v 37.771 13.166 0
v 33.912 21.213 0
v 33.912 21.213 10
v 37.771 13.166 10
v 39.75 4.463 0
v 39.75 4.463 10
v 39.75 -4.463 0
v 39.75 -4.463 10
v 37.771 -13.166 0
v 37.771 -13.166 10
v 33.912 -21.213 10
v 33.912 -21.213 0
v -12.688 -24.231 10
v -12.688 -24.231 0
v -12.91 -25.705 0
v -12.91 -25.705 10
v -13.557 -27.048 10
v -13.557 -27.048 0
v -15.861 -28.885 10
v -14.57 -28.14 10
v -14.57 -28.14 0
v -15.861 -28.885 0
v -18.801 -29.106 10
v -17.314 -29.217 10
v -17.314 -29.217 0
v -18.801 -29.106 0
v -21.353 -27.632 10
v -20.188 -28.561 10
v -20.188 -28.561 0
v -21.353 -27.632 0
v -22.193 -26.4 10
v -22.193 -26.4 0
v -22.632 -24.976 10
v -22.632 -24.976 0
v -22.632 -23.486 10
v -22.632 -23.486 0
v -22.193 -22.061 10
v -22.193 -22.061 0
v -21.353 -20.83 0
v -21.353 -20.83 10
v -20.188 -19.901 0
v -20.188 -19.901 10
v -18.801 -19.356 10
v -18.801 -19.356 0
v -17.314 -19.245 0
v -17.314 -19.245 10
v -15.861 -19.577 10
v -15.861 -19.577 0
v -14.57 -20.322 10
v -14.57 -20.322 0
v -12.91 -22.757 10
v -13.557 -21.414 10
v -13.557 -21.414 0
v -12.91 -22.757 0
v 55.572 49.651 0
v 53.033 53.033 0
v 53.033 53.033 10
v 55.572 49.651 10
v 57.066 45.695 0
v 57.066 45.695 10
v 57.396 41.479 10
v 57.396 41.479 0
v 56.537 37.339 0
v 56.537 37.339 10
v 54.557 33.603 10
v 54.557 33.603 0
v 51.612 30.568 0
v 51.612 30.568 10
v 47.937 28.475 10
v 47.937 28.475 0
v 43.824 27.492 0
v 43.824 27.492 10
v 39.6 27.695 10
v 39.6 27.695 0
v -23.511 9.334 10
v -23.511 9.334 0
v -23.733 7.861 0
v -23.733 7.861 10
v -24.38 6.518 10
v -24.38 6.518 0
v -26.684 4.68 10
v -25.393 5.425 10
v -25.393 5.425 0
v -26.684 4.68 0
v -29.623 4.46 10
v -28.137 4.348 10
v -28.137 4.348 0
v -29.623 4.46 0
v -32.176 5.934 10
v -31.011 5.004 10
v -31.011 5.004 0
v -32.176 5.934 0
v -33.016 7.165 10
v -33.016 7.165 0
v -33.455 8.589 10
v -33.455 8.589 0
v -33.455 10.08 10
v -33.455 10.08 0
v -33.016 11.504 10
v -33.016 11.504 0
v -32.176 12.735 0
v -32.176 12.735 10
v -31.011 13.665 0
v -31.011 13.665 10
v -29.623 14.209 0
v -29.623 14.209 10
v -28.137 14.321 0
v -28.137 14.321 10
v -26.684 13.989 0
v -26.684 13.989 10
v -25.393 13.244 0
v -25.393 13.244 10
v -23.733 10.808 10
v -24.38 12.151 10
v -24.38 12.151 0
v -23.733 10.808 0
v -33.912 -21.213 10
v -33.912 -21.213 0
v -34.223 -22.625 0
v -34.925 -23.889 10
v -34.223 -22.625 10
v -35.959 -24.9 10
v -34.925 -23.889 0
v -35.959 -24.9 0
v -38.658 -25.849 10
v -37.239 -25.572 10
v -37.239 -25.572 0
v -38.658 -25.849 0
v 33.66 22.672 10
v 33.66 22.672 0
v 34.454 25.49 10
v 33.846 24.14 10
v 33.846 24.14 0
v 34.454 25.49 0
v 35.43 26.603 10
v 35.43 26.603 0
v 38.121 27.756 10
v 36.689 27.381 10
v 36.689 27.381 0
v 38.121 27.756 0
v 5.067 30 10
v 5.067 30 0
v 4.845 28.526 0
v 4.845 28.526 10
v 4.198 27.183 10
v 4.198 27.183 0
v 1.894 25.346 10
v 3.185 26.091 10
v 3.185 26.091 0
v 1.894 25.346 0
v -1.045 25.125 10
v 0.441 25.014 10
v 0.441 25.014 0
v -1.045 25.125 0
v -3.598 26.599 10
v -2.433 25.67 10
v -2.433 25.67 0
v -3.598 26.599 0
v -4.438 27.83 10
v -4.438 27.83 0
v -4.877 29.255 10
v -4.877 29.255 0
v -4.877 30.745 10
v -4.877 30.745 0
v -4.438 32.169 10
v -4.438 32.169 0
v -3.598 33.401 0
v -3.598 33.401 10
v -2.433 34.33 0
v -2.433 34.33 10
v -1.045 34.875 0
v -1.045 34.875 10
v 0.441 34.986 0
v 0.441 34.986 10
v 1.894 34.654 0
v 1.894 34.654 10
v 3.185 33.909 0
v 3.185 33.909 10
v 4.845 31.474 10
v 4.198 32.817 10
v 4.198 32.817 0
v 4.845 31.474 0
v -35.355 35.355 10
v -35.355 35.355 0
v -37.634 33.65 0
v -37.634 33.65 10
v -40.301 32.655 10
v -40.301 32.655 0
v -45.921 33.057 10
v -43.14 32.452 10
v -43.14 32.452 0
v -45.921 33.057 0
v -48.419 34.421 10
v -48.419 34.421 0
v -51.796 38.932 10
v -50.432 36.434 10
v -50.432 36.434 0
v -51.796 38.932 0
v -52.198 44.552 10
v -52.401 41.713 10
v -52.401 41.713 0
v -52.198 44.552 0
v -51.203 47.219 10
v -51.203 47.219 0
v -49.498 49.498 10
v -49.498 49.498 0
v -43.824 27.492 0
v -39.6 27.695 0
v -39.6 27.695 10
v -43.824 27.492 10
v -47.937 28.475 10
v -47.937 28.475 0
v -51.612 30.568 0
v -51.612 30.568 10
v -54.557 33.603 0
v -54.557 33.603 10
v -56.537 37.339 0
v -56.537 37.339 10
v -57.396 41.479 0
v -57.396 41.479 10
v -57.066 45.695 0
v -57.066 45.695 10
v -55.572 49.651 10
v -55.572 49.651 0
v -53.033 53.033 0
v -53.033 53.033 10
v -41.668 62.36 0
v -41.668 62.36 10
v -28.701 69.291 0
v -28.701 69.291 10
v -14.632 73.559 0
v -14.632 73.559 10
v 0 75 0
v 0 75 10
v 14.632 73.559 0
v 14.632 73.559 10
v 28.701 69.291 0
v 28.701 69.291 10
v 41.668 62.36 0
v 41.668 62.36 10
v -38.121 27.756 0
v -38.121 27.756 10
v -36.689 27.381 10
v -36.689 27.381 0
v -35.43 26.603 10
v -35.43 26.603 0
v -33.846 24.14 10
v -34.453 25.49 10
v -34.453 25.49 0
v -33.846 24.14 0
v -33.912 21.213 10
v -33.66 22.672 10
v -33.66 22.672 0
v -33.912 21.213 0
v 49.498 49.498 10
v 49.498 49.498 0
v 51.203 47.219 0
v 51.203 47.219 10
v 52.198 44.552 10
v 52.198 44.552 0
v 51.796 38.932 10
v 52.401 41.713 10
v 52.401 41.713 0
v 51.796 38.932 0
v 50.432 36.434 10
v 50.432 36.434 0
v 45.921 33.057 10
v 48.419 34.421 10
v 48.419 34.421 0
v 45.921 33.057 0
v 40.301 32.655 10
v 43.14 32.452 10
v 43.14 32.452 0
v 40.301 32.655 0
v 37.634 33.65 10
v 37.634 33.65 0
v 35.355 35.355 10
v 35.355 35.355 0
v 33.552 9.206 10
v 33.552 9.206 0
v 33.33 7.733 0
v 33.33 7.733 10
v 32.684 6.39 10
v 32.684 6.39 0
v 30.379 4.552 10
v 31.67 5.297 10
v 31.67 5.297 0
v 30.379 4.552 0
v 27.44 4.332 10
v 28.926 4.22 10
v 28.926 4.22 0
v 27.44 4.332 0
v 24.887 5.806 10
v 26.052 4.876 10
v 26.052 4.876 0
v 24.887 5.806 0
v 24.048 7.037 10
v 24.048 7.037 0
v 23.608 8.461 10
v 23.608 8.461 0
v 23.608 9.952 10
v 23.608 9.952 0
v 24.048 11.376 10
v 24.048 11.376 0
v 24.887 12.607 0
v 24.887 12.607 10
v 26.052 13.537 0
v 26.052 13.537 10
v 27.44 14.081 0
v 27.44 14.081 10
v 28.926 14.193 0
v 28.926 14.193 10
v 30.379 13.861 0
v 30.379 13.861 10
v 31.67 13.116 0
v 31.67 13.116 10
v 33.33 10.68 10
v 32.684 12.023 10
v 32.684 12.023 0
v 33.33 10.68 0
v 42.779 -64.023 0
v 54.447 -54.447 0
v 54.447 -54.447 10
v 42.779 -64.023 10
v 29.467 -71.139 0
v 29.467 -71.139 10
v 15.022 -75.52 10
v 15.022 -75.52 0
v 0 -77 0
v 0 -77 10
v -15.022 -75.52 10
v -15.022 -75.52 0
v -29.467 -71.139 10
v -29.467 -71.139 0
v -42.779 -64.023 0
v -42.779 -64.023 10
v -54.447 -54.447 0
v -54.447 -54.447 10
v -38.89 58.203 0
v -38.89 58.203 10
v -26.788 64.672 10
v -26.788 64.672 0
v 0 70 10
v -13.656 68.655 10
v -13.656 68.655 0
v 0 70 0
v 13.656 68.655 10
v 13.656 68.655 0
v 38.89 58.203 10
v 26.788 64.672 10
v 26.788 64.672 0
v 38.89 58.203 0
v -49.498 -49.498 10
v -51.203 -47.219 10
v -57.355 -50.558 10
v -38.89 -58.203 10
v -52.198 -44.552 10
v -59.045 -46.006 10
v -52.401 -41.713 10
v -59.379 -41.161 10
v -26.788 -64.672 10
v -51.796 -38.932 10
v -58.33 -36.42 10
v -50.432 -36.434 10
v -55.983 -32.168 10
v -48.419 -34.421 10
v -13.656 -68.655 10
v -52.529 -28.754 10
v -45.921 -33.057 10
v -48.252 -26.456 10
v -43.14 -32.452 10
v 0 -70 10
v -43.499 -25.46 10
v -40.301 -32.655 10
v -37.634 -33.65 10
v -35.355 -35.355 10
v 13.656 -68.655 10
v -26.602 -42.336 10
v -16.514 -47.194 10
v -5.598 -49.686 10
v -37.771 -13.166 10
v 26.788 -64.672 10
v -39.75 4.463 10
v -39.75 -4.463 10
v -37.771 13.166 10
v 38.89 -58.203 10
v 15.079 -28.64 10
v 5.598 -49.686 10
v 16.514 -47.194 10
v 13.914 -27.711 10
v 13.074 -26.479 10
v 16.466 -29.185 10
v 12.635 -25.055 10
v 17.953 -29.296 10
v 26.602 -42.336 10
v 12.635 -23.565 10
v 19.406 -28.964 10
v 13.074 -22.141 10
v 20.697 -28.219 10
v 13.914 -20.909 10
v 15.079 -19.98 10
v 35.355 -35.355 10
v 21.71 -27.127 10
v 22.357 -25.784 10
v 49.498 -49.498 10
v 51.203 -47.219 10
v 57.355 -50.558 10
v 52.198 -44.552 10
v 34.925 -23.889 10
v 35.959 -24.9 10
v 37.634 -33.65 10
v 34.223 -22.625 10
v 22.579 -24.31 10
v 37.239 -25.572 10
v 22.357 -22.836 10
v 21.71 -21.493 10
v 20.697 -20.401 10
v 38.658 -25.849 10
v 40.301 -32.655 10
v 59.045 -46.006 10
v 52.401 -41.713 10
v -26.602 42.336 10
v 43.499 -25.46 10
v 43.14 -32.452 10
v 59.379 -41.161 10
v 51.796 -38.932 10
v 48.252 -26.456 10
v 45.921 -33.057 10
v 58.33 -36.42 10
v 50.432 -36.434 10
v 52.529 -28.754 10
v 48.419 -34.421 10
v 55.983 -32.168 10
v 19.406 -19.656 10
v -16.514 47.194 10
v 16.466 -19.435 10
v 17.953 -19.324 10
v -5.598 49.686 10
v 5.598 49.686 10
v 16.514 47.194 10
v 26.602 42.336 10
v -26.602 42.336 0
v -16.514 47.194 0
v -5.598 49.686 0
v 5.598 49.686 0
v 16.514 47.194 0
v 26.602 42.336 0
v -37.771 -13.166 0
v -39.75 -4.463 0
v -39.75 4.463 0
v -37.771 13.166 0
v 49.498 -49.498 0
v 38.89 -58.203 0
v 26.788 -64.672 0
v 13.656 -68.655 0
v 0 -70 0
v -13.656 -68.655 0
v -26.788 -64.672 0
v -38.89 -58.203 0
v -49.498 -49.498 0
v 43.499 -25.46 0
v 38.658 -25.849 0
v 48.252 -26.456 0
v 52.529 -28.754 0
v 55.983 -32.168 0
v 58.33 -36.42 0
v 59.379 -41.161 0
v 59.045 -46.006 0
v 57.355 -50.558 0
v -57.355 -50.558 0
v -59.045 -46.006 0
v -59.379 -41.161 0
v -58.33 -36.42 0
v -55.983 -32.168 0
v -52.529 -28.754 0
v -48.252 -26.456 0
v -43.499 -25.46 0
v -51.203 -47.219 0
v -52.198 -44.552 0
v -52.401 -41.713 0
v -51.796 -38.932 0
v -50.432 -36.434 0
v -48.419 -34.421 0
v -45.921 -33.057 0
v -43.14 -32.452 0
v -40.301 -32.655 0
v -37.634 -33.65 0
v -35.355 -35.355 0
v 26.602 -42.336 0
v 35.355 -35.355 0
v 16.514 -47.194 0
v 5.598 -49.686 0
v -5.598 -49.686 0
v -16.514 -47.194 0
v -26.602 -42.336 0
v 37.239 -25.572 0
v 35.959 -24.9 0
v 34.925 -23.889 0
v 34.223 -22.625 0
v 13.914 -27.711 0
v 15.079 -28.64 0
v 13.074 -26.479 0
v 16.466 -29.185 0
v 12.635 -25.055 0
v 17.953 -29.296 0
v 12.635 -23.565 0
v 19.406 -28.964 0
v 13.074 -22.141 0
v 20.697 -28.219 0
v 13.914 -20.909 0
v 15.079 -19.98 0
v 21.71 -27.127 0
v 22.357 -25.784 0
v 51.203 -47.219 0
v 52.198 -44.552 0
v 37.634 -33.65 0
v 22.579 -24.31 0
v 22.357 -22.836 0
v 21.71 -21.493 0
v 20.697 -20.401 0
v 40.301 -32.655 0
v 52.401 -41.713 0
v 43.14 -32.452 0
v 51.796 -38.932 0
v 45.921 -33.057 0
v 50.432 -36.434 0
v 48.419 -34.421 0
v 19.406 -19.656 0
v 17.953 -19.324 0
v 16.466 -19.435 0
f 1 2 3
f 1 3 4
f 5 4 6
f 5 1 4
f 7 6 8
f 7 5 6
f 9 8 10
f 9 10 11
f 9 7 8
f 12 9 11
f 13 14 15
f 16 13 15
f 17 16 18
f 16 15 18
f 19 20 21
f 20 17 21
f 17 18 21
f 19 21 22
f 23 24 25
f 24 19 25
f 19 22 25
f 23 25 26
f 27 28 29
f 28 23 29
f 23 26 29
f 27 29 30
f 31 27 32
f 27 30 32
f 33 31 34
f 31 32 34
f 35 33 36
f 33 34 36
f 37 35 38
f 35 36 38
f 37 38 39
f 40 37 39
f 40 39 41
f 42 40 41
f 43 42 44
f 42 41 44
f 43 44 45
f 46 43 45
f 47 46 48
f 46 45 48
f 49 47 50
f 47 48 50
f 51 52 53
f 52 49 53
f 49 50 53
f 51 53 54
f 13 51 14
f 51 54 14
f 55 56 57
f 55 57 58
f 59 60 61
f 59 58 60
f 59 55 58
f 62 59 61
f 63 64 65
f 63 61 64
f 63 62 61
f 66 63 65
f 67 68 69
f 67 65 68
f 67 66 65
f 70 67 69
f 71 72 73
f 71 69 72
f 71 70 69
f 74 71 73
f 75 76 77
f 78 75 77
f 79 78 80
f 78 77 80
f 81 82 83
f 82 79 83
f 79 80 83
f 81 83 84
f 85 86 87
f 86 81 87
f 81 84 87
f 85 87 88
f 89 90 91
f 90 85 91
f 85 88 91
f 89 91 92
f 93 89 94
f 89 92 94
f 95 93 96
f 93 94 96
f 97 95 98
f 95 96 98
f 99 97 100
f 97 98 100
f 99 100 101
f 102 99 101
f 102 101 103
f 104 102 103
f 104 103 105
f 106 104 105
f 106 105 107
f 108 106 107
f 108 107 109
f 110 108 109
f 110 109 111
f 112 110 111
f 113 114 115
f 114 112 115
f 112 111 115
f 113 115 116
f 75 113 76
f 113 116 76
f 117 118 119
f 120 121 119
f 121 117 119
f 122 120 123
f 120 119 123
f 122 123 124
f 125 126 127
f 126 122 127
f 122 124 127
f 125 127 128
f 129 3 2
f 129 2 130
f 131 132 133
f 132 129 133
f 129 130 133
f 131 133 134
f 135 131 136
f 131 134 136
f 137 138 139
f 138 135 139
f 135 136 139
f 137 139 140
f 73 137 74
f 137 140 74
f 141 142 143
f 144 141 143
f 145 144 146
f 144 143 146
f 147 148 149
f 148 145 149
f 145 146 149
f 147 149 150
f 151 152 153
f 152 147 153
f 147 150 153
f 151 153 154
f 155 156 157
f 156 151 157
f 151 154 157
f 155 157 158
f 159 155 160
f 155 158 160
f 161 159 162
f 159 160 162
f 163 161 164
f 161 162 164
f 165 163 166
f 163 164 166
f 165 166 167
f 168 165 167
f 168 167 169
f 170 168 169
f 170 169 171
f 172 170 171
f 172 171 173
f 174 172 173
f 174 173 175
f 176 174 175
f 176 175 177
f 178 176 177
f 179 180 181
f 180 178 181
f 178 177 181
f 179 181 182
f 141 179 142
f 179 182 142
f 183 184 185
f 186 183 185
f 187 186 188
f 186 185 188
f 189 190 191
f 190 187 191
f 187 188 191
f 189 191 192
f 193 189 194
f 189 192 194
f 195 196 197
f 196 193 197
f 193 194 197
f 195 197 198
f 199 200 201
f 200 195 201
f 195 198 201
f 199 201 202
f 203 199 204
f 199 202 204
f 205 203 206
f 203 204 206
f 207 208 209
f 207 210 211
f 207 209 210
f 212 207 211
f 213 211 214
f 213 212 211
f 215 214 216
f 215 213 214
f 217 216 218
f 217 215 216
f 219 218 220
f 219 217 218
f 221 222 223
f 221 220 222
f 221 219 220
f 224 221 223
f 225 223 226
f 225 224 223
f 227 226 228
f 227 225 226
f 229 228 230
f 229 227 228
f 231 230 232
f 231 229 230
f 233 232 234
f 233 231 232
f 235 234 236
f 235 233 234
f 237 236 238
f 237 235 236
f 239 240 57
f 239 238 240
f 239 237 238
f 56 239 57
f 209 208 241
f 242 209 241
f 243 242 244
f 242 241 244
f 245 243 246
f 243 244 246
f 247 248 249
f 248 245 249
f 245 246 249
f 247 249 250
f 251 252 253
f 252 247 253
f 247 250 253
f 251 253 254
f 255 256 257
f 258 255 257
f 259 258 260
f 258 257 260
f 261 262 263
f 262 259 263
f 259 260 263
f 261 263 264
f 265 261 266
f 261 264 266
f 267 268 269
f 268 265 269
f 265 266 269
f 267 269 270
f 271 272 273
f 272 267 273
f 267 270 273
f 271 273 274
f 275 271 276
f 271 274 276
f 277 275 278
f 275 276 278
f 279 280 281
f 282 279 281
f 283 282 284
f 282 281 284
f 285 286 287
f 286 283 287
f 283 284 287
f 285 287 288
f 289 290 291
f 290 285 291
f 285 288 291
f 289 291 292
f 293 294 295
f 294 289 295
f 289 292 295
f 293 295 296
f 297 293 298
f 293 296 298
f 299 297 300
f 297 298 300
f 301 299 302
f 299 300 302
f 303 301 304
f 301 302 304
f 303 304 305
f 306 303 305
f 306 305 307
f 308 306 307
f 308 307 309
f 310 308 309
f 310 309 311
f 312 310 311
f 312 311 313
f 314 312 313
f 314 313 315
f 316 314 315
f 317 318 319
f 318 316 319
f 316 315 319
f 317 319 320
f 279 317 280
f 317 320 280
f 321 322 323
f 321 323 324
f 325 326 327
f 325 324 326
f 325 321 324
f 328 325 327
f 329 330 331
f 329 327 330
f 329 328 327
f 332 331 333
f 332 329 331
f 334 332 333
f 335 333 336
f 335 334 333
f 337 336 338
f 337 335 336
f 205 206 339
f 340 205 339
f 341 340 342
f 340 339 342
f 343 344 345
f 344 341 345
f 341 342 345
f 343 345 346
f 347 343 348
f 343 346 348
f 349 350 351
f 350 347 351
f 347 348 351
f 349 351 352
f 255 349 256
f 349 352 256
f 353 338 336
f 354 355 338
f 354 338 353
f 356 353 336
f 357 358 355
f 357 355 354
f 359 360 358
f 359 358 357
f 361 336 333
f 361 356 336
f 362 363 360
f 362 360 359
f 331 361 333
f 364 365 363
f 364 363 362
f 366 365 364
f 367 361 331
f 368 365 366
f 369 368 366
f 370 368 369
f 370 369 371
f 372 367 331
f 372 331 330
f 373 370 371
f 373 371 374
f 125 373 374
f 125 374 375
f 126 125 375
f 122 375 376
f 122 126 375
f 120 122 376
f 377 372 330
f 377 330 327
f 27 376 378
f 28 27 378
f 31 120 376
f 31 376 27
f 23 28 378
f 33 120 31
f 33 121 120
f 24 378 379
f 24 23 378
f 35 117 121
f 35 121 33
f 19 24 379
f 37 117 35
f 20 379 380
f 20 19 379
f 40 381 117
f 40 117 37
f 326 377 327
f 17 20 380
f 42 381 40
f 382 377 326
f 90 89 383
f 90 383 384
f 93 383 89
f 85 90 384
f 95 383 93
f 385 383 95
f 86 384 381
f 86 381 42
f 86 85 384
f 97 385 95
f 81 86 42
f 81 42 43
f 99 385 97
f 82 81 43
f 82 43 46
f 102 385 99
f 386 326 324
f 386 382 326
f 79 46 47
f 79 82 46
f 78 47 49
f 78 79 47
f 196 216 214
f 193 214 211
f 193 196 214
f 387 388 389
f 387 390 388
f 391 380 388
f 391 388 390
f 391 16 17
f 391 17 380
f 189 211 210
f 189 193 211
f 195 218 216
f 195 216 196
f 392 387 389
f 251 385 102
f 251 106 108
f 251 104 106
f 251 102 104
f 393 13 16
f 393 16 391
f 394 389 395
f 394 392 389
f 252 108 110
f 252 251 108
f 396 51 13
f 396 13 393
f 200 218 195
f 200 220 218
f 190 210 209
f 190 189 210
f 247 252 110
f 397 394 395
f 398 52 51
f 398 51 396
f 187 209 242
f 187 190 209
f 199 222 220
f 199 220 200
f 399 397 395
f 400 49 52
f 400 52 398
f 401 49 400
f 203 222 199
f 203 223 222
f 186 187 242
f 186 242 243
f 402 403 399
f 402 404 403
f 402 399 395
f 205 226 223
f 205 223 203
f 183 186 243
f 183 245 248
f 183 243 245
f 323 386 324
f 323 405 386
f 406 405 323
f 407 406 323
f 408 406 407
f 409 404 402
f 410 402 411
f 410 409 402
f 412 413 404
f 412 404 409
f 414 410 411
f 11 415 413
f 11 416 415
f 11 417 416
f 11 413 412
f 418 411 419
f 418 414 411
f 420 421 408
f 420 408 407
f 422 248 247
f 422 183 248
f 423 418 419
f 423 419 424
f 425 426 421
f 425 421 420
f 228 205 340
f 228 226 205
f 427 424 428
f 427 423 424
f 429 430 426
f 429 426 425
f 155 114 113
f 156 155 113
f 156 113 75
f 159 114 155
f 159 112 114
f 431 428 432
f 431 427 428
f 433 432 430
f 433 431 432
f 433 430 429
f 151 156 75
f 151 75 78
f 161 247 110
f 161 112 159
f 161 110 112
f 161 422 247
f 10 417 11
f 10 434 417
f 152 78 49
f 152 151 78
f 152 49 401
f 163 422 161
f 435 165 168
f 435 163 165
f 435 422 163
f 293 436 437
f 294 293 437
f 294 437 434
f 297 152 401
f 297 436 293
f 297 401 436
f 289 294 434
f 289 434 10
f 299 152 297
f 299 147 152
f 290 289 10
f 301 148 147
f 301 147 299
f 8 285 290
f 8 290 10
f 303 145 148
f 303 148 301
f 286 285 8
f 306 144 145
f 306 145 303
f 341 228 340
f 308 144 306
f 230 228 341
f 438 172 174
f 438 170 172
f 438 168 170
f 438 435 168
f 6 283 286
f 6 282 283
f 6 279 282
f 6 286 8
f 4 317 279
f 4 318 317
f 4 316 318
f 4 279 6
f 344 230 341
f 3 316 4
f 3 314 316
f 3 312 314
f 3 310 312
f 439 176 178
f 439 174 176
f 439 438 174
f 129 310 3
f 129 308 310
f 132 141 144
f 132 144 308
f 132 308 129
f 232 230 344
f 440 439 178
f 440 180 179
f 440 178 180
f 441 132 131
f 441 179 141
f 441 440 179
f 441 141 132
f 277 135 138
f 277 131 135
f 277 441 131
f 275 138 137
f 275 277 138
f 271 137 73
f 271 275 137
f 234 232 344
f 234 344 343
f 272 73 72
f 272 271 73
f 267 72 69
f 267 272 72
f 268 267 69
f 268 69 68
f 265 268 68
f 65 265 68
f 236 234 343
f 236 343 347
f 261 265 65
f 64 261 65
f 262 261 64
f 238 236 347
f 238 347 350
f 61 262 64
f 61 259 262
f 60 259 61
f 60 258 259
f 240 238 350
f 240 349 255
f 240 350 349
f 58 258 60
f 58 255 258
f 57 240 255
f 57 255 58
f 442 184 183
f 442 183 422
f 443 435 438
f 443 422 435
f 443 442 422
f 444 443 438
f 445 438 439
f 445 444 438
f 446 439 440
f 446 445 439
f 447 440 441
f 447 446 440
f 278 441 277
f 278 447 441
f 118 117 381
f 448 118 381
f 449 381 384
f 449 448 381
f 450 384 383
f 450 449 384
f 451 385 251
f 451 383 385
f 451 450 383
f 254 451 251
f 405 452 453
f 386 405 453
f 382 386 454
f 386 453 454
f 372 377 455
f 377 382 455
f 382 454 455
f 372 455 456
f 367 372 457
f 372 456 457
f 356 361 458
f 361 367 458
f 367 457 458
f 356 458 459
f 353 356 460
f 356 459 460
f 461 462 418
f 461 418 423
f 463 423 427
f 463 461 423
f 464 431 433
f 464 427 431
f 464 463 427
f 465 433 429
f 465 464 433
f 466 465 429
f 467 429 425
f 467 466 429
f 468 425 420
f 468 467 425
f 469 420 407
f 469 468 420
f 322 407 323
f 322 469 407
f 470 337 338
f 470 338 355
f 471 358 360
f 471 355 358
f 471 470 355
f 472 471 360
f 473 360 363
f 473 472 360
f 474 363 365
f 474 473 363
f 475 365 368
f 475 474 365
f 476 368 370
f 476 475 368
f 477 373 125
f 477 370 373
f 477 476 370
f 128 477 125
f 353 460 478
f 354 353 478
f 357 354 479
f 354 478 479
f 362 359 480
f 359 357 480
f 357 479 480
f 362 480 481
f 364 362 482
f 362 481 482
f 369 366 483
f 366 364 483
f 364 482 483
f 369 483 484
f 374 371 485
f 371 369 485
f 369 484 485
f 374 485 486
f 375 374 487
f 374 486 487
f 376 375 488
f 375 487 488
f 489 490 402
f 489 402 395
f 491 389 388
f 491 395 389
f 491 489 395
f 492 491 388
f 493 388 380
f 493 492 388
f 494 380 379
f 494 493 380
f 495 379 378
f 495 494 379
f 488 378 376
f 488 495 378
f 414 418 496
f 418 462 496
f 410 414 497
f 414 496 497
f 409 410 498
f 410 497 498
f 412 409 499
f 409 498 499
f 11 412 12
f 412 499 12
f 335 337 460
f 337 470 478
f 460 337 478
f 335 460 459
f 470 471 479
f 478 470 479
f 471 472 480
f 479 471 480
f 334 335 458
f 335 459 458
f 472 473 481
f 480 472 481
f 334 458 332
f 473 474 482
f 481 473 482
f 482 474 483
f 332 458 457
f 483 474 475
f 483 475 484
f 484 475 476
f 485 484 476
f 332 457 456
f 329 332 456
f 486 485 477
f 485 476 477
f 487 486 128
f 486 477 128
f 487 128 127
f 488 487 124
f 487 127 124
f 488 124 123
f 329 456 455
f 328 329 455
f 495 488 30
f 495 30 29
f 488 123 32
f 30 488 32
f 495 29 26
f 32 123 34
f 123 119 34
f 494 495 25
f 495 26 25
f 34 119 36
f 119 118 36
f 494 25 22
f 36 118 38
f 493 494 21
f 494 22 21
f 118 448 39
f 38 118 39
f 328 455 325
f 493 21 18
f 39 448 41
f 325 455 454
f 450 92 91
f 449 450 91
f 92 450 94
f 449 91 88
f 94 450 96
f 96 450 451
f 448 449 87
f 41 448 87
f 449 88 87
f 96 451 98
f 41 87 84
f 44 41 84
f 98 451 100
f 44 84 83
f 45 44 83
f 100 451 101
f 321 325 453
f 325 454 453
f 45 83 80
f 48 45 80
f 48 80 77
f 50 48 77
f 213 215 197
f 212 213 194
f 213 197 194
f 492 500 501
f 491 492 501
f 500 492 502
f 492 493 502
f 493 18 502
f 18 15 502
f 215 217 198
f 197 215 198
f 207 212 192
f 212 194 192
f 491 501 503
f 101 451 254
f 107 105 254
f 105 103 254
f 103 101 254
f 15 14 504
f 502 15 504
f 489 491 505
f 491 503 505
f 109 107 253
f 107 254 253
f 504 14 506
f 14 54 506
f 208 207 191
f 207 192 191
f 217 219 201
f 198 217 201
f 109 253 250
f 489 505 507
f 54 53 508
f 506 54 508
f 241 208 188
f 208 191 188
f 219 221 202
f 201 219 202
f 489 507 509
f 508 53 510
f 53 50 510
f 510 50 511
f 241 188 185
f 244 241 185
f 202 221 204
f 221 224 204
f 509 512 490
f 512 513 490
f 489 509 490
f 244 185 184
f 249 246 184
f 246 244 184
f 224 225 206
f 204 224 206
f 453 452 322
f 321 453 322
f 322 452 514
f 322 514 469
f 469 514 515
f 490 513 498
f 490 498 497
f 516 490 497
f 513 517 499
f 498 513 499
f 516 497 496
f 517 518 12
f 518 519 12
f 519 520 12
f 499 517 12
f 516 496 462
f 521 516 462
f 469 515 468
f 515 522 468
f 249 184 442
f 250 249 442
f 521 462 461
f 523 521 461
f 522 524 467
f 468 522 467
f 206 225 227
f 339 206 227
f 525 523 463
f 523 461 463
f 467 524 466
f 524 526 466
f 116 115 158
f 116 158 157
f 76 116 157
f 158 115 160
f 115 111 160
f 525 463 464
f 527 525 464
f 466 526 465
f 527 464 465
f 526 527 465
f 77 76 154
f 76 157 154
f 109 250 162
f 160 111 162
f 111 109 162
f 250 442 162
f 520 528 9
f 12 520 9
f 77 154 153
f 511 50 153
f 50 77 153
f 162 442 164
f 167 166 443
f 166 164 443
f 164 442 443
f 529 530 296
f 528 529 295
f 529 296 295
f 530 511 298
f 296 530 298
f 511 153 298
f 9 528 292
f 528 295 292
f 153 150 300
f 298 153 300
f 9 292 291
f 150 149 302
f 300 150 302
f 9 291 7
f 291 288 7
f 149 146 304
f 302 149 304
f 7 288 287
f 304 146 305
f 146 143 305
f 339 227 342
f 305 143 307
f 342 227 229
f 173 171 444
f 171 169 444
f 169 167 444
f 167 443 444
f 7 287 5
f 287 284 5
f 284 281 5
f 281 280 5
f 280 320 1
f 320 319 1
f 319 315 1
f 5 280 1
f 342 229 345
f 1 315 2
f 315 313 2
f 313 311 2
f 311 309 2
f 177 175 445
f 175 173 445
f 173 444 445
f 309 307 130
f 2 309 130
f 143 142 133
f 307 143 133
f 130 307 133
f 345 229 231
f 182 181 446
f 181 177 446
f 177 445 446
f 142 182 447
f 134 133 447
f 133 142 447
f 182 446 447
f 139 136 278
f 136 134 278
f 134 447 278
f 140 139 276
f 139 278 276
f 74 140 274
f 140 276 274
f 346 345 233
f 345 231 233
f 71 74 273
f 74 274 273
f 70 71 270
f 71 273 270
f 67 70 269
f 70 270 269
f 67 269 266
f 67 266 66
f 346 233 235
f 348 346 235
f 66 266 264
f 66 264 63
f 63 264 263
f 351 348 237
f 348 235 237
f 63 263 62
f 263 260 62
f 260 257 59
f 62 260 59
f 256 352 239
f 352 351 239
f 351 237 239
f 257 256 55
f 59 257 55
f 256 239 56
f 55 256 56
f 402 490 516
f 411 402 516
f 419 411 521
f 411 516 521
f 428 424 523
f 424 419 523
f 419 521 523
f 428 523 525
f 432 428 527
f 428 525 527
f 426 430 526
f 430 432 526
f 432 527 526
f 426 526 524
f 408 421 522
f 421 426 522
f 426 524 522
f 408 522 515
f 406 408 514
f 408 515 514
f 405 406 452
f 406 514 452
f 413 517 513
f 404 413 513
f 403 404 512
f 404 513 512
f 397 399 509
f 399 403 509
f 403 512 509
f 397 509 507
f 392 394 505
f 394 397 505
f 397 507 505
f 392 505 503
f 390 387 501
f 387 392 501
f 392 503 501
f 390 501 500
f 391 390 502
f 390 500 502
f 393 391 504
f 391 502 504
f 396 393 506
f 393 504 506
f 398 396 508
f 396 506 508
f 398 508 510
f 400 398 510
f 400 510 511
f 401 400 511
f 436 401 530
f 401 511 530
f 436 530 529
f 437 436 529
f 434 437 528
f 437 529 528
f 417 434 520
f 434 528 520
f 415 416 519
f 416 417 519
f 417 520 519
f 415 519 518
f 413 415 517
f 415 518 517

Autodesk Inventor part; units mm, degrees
ref_plane "YZ Plane" through (0, 0, 0) normal (1, 0, 0) x (0, 1, 0)
ref_plane "XZ Plane" through (0, 0, 0) normal (0, 1, 0) x (-1, 0, 0)
ref_plane "XY Plane" through (0, 0, 0) normal (0, 0, 1) x (1, 0, 0)
sketch "Эскиз1" plane through (0, 0, 0) normal (0, 0, 1) x (1, 0, 0)
  circle A0 centre (0, 0) radius 40
  circle A1 centre (0, 0) radius 30 construction
  line L0 (17.5791, -24.31) -> (-17.6879, -24.2309) construction
  line L1 (-17.6879, -24.2309) -> (-28.5108, 9.3345) construction
  line L2 (-28.5108, 9.3345) -> (0.0673, 29.9999) construction
  line L3 (0.0673, 29.9999) -> (28.5524, 9.2065) construction
  line L4 (28.5524, 9.2065) -> (17.5791, -24.31) construction
  circle A2 centre (-28.5108, 9.3345) radius 5
  circle A3 centre (0.0673, 29.9999) radius 5
  circle A4 centre (28.5524, 9.2065) radius 5
  circle A5 centre (17.5791, -24.31) radius 5
  circle A6 centre (-17.6879, -24.2309) radius 5
  circle A7 centre (0, 0) radius 60 construction
  line L5 (0, 0) -> (42.4264, 42.4264)
  line L6 (0, 0) -> (60, 0) construction
  line L7 (42.4264, 42.4264) -> (-42.4264, 42.4264) construction
  line L8 (-42.4264, 42.4264) -> (-42.4264, -42.4264) construction
  line L9 (42.4264, -42.4264) -> (42.4264, 42.4264) construction
  line L10 (-42.4264, -42.4264) -> (42.4264, -42.4264) construction
  arc A8 (42.4264, 42.4264) -> (-42.4264, 42.4264) centre (0, 0) ccw construction
  arc A9 (49.4975, 49.4975) -> (-49.4975, 49.4975) centre (0, 0) ccw
  arc A10 (35.3553, 35.3553) -> (-35.3553, 35.3553) centre (0, 0) ccw
  arc A11 (35.3553, 35.3553) -> (49.4975, 49.4975) centre (42.4264, 42.4264) ccw
  arc A12 (-49.4975, 49.4975) -> (-35.3553, 35.3553) centre (-42.4264, 42.4264) ccw
  arc A13 (42.4264, 42.4264) -> (-42.4264, 42.4264) centre (0, 0) ccw construction
  arc A14 (53.033, 53.033) -> (-53.033, 53.033) centre (0, 0) ccw
  arc A15 (-42.4264, -42.4264) -> (42.4264, -42.4264) centre (0, 0) ccw construction
  arc A16 (-49.4975, -49.4975) -> (49.4975, -49.4975) centre (0, 0) ccw
  arc A17 (-35.3553, -35.3553) -> (35.3553, -35.3553) centre (0, 0) ccw
  arc A18 (-35.3553, -35.3553) -> (-49.4975, -49.4975) centre (-42.4264, -42.4264) ccw
  arc A19 (49.4975, -49.4975) -> (35.3553, -35.3553) centre (42.4264, -42.4264) ccw
  arc A20 (-42.4264, -42.4264) -> (42.4264, -42.4264) centre (0, 0) ccw construction
  arc A21 (-54.4472, -54.4472) -> (54.4472, -54.4472) centre (0, 0) ccw
  arc A22 (-33.9116, 21.2132) -> (-39.6003, 27.695) centre (-38.6583, 22.7846) ccw
  arc A23 (39.6003, 27.695) -> (33.9116, 21.2132) centre (38.6583, 22.7846) ccw
  arc A24 (-38.6583, -25.8493) -> (-33.9116, -21.2132) centre (-38.8988, -20.8551) ccw
  arc A25 (33.9116, -21.2132) -> (38.6583, -25.8493) centre (38.8988, -20.8551) ccw
  arc A26 (-53.033, 53.033) -> (-39.6003, 27.695) centre (-42.4264, 42.4264) ccw
  arc A27 (39.6003, 27.695) -> (53.033, 53.033) centre (42.4264, 42.4264) ccw
  arc A28 (-38.6583, -25.8493) -> (-54.4472, -54.4472) centre (-42.4264, -42.4264) ccw
  arc A29 (54.4472, -54.4472) -> (38.6583, -25.8493) centre (42.4264, -42.4264) ccw
  dimension "d1" = 60
  dimension "d0" = 80
  dimension "d8" = 10
  dimension "d9" = 33.5165
  dimension "d22" = 120
  dimension "d23" = 60
  dimension "d24" = 45
  dimension "d25" = 20
  dimension "d27" = 20
  dimension "d29" = 5
  dimension "d31" = 5
  dimension "d32" = 5
  dimension "d33" = 5
  dimension "d34" = 2.8261
  dimension "d35" = 3.5276
  dimension "d36" = 20.8551
  dimension "d37" = 76.338
  dimension "d38" = 76.3381
  dimension "d39" = 81.0847
  dimension "d40" = 15
  dimension "d41" = 17
sketch "Эскиз2" plane through (0, 0, 0) normal (0, 0, 1) x (1, 0, 0)
  point P0 (0, 0)
extrude "Выдавливание1" add sketch "Эскиз1" along normal blind 10
properties part number "пр3дет1"
